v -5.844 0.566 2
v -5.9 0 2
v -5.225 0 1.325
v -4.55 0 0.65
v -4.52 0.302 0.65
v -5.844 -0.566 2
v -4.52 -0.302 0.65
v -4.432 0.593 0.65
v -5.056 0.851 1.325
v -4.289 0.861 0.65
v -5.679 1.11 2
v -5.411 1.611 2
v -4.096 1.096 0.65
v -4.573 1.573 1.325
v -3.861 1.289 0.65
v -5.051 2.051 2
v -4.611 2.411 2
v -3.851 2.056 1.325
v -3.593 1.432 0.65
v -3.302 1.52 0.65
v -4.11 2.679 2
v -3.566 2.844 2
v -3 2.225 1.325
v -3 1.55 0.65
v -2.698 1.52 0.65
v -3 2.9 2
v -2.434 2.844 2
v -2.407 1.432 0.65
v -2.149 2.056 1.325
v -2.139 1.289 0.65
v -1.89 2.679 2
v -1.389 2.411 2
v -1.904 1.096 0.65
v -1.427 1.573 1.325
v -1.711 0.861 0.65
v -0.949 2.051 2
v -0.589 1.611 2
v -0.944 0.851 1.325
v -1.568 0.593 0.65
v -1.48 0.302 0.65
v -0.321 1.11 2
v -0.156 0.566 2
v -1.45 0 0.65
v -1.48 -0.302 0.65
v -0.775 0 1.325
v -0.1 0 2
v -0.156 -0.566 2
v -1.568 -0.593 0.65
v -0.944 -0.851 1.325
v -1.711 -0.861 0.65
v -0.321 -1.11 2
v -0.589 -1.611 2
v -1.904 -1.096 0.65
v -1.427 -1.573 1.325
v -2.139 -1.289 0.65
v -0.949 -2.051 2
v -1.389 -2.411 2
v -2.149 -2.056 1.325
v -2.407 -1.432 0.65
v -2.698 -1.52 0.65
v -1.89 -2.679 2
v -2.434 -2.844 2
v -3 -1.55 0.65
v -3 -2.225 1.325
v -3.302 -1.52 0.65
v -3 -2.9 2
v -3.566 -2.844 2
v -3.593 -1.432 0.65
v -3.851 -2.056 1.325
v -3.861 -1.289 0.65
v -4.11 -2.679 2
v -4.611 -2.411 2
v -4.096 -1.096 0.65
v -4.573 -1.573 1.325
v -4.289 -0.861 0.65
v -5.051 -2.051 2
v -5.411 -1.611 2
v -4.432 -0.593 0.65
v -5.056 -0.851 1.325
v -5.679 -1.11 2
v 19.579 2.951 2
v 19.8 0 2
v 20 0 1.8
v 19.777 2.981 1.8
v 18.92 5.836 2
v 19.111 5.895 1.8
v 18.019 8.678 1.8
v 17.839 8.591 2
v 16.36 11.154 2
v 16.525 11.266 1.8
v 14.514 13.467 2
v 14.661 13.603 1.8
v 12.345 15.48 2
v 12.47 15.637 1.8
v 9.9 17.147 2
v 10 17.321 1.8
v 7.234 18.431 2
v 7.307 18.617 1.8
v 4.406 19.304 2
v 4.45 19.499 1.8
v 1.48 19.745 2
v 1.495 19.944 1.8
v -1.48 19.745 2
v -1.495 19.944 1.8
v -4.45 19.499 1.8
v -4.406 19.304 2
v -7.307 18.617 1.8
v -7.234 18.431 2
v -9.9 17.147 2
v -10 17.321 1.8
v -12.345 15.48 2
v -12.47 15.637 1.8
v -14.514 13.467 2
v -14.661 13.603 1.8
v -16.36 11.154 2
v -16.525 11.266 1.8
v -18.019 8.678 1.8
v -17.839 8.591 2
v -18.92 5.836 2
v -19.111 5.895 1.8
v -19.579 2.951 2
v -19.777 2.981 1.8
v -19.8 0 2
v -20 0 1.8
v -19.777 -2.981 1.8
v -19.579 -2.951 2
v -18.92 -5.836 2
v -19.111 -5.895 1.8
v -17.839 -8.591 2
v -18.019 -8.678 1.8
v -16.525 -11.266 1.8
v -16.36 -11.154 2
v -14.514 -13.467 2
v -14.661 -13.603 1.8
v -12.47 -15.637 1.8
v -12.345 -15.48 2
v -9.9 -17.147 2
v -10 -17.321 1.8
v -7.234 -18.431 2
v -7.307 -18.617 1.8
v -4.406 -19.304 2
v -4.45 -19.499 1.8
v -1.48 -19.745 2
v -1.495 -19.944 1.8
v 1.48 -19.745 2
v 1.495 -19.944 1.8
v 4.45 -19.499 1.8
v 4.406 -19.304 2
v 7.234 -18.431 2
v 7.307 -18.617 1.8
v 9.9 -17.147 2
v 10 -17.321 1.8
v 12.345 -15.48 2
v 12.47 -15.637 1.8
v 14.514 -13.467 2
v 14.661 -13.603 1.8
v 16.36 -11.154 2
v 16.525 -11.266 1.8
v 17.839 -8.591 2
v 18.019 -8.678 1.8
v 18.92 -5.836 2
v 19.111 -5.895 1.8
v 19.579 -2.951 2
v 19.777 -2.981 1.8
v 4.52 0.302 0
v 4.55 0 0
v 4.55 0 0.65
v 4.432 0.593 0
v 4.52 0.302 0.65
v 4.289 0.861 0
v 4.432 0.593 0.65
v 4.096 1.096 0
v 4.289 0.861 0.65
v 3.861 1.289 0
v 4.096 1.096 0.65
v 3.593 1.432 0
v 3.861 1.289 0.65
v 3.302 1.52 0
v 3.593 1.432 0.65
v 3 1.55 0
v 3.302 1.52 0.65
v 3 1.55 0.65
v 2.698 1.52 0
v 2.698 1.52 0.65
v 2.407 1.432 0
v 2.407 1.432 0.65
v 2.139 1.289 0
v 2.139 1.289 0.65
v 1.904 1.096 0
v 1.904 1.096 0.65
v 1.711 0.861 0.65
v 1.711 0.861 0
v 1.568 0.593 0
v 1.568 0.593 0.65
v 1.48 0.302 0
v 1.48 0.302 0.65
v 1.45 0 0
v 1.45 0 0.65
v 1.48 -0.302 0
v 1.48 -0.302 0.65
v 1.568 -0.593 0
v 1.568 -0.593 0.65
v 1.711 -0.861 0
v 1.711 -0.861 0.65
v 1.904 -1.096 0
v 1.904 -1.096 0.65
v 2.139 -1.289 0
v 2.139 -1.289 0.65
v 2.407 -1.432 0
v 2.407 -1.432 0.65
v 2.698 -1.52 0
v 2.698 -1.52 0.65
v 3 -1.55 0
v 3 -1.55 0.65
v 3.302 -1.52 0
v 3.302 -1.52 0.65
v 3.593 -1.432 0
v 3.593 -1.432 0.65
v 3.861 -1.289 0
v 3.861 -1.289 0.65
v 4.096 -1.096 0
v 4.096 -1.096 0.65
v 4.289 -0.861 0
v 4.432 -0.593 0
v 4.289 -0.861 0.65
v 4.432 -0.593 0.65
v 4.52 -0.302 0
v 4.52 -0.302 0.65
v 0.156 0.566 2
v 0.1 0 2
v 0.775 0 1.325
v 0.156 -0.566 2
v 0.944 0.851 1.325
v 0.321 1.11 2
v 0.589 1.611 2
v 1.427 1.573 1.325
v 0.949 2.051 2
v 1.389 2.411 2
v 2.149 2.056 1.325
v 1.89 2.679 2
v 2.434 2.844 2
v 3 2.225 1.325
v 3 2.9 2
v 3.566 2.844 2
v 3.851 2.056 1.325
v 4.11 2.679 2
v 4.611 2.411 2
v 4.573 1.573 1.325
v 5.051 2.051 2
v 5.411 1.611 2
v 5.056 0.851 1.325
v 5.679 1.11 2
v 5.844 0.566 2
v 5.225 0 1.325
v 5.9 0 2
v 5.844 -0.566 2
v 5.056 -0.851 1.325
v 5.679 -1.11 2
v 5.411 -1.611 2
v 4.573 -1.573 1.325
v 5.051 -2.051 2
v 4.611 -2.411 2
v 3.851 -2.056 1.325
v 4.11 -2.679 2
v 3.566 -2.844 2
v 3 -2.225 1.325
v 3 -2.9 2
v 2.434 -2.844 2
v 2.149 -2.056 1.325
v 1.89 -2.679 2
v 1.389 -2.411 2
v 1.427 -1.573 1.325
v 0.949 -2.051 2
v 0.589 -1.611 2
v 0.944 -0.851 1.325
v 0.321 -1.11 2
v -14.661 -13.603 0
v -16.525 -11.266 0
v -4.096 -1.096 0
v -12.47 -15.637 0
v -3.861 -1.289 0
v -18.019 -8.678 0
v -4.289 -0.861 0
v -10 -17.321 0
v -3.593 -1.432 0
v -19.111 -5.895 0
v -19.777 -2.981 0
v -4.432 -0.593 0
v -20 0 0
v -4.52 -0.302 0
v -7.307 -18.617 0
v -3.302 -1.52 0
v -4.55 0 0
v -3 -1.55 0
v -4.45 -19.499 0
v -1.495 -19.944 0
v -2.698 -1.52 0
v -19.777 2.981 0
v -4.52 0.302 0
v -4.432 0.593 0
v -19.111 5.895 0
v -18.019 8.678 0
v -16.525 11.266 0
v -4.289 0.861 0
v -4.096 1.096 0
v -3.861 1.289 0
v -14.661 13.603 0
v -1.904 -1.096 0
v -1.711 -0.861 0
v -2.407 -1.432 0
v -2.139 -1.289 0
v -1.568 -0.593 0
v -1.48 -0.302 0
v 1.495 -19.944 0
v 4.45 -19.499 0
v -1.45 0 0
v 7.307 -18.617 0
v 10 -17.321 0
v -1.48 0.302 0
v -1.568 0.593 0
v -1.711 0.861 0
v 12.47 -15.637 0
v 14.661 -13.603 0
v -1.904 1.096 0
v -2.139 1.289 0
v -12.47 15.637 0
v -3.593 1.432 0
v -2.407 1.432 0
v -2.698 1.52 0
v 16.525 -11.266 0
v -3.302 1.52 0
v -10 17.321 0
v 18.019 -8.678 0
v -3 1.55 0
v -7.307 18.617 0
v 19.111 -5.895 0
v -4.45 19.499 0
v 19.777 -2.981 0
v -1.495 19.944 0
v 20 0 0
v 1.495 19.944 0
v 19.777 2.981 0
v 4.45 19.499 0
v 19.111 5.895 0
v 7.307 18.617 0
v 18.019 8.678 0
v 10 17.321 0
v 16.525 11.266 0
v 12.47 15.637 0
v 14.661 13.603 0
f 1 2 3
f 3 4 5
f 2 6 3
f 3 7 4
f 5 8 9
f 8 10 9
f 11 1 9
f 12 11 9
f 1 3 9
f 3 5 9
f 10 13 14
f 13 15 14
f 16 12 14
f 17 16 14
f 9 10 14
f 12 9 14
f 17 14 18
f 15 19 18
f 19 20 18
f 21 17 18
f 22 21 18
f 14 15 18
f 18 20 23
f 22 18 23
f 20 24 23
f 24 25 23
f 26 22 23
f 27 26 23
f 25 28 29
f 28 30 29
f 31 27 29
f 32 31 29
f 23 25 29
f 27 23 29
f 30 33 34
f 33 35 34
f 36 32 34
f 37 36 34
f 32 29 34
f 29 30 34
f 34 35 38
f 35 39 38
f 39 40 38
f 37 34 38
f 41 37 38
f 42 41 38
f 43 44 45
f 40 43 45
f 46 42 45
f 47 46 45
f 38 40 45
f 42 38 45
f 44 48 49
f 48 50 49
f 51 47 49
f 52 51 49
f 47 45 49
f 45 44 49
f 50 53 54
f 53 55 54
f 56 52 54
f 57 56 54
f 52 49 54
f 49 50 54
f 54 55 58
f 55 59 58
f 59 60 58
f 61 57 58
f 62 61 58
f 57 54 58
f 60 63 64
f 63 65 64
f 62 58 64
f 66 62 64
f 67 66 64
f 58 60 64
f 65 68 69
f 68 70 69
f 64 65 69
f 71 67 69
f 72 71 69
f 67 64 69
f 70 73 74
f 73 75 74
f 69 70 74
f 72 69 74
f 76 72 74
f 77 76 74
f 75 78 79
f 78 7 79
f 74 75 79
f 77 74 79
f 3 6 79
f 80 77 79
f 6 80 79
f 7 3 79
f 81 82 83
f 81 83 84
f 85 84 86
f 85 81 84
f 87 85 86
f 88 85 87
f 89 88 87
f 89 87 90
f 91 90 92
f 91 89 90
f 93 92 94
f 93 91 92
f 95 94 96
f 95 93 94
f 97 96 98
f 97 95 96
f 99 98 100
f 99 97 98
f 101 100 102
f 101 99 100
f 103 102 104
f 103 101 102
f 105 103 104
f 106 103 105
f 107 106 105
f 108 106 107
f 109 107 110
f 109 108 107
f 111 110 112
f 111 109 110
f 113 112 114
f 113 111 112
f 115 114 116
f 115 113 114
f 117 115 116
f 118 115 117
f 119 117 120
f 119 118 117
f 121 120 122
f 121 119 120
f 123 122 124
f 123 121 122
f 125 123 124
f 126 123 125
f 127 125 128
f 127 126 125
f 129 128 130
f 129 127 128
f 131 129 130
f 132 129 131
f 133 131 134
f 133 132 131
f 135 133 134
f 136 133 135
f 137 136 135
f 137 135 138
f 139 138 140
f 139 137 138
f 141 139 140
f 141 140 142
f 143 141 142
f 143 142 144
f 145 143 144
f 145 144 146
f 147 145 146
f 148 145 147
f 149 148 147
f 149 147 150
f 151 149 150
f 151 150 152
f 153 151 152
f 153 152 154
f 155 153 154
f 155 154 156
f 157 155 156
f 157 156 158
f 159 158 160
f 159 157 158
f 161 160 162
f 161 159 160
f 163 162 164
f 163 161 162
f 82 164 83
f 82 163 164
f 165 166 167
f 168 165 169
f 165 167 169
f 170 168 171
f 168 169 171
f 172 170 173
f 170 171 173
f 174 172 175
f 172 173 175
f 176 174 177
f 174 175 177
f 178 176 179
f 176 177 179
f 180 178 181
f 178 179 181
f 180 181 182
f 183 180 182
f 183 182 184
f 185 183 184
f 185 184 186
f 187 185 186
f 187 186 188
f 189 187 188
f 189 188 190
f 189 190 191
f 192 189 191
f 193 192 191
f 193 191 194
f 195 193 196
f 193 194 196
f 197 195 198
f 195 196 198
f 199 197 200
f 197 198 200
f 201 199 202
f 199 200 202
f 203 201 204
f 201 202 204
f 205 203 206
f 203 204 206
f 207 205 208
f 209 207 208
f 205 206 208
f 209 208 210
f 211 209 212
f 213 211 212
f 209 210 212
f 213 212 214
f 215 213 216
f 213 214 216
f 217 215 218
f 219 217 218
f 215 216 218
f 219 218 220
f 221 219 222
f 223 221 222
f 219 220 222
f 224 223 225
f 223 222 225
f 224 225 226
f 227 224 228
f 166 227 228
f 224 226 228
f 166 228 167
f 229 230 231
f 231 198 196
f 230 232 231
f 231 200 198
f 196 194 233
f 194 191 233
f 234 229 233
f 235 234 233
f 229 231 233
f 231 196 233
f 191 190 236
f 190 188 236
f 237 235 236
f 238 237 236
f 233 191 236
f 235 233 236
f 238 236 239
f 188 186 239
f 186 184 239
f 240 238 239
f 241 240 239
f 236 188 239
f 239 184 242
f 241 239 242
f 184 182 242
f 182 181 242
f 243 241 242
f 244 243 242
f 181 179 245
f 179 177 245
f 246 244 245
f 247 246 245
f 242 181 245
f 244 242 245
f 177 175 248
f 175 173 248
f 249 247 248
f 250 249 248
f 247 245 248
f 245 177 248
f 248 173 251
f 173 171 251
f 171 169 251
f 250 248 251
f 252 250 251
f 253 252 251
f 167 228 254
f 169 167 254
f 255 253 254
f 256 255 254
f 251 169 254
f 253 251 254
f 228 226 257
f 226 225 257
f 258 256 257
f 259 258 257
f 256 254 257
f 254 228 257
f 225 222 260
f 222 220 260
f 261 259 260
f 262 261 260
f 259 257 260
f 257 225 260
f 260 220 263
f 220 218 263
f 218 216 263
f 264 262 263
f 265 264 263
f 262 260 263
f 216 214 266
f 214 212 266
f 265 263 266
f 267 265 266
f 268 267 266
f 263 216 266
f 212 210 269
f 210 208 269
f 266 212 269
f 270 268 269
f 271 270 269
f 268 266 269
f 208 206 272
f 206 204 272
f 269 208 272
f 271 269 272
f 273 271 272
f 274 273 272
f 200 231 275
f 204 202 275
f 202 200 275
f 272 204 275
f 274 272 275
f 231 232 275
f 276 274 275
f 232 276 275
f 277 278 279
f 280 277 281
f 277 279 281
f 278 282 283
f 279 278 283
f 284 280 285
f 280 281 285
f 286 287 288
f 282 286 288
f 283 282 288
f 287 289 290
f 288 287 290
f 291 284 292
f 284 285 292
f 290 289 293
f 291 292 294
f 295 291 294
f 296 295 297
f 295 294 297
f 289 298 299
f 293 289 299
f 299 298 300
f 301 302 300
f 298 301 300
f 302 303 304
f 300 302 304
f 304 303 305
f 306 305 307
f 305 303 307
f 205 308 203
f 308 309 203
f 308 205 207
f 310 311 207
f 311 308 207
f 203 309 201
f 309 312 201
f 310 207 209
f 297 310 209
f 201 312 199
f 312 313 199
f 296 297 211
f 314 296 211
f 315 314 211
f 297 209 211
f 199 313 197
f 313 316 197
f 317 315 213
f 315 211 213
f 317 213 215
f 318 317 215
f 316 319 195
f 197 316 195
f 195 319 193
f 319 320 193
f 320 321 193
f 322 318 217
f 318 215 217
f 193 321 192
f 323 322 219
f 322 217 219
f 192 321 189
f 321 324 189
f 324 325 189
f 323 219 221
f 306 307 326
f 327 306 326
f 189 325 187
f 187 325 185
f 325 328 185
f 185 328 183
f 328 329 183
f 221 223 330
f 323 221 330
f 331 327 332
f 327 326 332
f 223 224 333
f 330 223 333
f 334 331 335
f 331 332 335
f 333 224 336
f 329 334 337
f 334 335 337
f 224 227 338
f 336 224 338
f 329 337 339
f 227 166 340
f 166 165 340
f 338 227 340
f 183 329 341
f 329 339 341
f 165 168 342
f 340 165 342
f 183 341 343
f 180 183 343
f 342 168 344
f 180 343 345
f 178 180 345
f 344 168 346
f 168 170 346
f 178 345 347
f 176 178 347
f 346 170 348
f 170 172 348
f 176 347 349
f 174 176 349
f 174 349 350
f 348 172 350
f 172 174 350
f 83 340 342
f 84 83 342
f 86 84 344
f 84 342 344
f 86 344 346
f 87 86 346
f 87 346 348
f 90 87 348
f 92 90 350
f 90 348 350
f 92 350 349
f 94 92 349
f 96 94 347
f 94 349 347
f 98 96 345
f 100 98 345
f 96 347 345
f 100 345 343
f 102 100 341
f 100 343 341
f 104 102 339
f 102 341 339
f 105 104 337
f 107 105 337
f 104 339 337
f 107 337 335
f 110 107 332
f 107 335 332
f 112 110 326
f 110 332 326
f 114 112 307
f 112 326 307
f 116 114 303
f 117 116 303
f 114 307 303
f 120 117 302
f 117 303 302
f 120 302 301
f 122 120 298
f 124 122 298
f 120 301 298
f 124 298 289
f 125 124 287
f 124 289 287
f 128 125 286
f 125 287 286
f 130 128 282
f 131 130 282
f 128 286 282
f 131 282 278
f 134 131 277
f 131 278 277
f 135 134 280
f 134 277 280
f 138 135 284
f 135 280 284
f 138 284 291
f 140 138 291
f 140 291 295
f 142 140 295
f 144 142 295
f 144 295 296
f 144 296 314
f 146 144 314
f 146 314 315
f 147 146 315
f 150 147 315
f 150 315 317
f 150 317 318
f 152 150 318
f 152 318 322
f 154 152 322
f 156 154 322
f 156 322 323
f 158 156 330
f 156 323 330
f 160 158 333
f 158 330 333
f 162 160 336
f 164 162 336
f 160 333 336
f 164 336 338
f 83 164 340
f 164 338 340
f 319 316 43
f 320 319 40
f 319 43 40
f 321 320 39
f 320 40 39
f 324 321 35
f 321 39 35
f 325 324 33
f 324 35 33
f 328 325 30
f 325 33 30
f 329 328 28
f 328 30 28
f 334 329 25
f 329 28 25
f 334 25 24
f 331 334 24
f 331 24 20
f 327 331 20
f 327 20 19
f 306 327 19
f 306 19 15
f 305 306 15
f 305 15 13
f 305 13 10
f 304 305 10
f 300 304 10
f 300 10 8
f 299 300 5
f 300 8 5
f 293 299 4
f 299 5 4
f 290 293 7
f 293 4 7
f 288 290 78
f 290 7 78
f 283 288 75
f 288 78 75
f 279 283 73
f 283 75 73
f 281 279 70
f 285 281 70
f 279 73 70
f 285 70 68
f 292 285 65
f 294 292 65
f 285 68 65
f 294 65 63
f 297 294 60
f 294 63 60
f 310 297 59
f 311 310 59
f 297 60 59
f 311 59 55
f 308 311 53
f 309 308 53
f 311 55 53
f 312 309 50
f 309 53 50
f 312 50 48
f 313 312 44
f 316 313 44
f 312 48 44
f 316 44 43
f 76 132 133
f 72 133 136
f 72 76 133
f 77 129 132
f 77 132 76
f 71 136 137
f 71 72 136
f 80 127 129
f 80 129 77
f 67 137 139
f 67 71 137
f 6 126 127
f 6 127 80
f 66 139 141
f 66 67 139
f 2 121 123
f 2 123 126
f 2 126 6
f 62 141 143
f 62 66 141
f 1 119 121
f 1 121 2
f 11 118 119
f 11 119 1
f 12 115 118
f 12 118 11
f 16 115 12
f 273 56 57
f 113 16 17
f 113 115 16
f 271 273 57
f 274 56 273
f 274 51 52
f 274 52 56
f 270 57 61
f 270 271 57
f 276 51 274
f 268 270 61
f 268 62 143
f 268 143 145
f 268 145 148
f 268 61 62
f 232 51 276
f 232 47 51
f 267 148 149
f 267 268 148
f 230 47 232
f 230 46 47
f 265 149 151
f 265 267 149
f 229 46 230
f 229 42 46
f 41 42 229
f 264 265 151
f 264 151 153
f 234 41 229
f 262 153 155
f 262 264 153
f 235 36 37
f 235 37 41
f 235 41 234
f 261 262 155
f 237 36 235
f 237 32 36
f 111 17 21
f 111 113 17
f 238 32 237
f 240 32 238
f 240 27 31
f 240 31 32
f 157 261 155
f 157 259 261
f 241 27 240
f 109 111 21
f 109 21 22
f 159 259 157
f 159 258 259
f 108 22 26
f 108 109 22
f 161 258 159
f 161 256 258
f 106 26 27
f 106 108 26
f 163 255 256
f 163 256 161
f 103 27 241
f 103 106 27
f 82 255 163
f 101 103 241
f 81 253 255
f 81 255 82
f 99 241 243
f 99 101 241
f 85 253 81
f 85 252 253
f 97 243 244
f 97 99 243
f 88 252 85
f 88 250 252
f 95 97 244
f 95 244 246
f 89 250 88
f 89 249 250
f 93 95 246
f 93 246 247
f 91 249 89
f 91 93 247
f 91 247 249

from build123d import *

# Parameters (mm, degrees)
SKETCH_1_R                   = 20
EXTRUDE_1_DEPTH              = 2
SKETCH_2_R                   = 1.55
CUT_EXTRUDE_1_DEPTH          = 2
HOLE_WIZARD_M3_1_D           = 3.1
HOLE_WIZARD_M3_1_DEPTH       = 10
HOLE_WIZARD_M3_1_CSINK_D     = 5.8
HOLE_WIZARD_M3_1_CSINK_ANGLE = 90
CHAMFER_1_SIZE               = 0.2


with BuildPart() as part:
    # 草图1 → 凸台-拉伸1 (new body)
    with BuildSketch(Plane.XY):
        Circle(SKETCH_1_R)
    extrude(amount=EXTRUDE_1_DEPTH)

    # 草图2 → 切除-拉伸1 (cut)
    with BuildSketch(Plane.XY.offset(2)):
        with Locations((-3, 0)):
            Circle(SKETCH_2_R)
        with Locations((3, 0)):
            Circle(SKETCH_2_R)
    extrude(amount=-CUT_EXTRUDE_1_DEPTH, mode=Mode.SUBTRACT)

    # M3 六角凹锥坑螺钉的锥形沉头孔1
    with Locations(Plane(origin=(-3, 0, 2), x_dir=(1, 0, 0), z_dir=(0, 0, 1))):
        with Locations((0, 0), (6, 0)):
            CounterSinkHole(HOLE_WIZARD_M3_1_D / 2, HOLE_WIZARD_M3_1_CSINK_D / 2, depth=HOLE_WIZARD_M3_1_DEPTH, counter_sink_angle=HOLE_WIZARD_M3_1_CSINK_ANGLE)

    # 倒角1
    chamfer_1_edges = [part.edges().sort_by_distance(p)[0] for p in [
        (-20, 0, 2),
    ]]
    chamfer(chamfer_1_edges, length=CHAMFER_1_SIZE)


solid = part.part
